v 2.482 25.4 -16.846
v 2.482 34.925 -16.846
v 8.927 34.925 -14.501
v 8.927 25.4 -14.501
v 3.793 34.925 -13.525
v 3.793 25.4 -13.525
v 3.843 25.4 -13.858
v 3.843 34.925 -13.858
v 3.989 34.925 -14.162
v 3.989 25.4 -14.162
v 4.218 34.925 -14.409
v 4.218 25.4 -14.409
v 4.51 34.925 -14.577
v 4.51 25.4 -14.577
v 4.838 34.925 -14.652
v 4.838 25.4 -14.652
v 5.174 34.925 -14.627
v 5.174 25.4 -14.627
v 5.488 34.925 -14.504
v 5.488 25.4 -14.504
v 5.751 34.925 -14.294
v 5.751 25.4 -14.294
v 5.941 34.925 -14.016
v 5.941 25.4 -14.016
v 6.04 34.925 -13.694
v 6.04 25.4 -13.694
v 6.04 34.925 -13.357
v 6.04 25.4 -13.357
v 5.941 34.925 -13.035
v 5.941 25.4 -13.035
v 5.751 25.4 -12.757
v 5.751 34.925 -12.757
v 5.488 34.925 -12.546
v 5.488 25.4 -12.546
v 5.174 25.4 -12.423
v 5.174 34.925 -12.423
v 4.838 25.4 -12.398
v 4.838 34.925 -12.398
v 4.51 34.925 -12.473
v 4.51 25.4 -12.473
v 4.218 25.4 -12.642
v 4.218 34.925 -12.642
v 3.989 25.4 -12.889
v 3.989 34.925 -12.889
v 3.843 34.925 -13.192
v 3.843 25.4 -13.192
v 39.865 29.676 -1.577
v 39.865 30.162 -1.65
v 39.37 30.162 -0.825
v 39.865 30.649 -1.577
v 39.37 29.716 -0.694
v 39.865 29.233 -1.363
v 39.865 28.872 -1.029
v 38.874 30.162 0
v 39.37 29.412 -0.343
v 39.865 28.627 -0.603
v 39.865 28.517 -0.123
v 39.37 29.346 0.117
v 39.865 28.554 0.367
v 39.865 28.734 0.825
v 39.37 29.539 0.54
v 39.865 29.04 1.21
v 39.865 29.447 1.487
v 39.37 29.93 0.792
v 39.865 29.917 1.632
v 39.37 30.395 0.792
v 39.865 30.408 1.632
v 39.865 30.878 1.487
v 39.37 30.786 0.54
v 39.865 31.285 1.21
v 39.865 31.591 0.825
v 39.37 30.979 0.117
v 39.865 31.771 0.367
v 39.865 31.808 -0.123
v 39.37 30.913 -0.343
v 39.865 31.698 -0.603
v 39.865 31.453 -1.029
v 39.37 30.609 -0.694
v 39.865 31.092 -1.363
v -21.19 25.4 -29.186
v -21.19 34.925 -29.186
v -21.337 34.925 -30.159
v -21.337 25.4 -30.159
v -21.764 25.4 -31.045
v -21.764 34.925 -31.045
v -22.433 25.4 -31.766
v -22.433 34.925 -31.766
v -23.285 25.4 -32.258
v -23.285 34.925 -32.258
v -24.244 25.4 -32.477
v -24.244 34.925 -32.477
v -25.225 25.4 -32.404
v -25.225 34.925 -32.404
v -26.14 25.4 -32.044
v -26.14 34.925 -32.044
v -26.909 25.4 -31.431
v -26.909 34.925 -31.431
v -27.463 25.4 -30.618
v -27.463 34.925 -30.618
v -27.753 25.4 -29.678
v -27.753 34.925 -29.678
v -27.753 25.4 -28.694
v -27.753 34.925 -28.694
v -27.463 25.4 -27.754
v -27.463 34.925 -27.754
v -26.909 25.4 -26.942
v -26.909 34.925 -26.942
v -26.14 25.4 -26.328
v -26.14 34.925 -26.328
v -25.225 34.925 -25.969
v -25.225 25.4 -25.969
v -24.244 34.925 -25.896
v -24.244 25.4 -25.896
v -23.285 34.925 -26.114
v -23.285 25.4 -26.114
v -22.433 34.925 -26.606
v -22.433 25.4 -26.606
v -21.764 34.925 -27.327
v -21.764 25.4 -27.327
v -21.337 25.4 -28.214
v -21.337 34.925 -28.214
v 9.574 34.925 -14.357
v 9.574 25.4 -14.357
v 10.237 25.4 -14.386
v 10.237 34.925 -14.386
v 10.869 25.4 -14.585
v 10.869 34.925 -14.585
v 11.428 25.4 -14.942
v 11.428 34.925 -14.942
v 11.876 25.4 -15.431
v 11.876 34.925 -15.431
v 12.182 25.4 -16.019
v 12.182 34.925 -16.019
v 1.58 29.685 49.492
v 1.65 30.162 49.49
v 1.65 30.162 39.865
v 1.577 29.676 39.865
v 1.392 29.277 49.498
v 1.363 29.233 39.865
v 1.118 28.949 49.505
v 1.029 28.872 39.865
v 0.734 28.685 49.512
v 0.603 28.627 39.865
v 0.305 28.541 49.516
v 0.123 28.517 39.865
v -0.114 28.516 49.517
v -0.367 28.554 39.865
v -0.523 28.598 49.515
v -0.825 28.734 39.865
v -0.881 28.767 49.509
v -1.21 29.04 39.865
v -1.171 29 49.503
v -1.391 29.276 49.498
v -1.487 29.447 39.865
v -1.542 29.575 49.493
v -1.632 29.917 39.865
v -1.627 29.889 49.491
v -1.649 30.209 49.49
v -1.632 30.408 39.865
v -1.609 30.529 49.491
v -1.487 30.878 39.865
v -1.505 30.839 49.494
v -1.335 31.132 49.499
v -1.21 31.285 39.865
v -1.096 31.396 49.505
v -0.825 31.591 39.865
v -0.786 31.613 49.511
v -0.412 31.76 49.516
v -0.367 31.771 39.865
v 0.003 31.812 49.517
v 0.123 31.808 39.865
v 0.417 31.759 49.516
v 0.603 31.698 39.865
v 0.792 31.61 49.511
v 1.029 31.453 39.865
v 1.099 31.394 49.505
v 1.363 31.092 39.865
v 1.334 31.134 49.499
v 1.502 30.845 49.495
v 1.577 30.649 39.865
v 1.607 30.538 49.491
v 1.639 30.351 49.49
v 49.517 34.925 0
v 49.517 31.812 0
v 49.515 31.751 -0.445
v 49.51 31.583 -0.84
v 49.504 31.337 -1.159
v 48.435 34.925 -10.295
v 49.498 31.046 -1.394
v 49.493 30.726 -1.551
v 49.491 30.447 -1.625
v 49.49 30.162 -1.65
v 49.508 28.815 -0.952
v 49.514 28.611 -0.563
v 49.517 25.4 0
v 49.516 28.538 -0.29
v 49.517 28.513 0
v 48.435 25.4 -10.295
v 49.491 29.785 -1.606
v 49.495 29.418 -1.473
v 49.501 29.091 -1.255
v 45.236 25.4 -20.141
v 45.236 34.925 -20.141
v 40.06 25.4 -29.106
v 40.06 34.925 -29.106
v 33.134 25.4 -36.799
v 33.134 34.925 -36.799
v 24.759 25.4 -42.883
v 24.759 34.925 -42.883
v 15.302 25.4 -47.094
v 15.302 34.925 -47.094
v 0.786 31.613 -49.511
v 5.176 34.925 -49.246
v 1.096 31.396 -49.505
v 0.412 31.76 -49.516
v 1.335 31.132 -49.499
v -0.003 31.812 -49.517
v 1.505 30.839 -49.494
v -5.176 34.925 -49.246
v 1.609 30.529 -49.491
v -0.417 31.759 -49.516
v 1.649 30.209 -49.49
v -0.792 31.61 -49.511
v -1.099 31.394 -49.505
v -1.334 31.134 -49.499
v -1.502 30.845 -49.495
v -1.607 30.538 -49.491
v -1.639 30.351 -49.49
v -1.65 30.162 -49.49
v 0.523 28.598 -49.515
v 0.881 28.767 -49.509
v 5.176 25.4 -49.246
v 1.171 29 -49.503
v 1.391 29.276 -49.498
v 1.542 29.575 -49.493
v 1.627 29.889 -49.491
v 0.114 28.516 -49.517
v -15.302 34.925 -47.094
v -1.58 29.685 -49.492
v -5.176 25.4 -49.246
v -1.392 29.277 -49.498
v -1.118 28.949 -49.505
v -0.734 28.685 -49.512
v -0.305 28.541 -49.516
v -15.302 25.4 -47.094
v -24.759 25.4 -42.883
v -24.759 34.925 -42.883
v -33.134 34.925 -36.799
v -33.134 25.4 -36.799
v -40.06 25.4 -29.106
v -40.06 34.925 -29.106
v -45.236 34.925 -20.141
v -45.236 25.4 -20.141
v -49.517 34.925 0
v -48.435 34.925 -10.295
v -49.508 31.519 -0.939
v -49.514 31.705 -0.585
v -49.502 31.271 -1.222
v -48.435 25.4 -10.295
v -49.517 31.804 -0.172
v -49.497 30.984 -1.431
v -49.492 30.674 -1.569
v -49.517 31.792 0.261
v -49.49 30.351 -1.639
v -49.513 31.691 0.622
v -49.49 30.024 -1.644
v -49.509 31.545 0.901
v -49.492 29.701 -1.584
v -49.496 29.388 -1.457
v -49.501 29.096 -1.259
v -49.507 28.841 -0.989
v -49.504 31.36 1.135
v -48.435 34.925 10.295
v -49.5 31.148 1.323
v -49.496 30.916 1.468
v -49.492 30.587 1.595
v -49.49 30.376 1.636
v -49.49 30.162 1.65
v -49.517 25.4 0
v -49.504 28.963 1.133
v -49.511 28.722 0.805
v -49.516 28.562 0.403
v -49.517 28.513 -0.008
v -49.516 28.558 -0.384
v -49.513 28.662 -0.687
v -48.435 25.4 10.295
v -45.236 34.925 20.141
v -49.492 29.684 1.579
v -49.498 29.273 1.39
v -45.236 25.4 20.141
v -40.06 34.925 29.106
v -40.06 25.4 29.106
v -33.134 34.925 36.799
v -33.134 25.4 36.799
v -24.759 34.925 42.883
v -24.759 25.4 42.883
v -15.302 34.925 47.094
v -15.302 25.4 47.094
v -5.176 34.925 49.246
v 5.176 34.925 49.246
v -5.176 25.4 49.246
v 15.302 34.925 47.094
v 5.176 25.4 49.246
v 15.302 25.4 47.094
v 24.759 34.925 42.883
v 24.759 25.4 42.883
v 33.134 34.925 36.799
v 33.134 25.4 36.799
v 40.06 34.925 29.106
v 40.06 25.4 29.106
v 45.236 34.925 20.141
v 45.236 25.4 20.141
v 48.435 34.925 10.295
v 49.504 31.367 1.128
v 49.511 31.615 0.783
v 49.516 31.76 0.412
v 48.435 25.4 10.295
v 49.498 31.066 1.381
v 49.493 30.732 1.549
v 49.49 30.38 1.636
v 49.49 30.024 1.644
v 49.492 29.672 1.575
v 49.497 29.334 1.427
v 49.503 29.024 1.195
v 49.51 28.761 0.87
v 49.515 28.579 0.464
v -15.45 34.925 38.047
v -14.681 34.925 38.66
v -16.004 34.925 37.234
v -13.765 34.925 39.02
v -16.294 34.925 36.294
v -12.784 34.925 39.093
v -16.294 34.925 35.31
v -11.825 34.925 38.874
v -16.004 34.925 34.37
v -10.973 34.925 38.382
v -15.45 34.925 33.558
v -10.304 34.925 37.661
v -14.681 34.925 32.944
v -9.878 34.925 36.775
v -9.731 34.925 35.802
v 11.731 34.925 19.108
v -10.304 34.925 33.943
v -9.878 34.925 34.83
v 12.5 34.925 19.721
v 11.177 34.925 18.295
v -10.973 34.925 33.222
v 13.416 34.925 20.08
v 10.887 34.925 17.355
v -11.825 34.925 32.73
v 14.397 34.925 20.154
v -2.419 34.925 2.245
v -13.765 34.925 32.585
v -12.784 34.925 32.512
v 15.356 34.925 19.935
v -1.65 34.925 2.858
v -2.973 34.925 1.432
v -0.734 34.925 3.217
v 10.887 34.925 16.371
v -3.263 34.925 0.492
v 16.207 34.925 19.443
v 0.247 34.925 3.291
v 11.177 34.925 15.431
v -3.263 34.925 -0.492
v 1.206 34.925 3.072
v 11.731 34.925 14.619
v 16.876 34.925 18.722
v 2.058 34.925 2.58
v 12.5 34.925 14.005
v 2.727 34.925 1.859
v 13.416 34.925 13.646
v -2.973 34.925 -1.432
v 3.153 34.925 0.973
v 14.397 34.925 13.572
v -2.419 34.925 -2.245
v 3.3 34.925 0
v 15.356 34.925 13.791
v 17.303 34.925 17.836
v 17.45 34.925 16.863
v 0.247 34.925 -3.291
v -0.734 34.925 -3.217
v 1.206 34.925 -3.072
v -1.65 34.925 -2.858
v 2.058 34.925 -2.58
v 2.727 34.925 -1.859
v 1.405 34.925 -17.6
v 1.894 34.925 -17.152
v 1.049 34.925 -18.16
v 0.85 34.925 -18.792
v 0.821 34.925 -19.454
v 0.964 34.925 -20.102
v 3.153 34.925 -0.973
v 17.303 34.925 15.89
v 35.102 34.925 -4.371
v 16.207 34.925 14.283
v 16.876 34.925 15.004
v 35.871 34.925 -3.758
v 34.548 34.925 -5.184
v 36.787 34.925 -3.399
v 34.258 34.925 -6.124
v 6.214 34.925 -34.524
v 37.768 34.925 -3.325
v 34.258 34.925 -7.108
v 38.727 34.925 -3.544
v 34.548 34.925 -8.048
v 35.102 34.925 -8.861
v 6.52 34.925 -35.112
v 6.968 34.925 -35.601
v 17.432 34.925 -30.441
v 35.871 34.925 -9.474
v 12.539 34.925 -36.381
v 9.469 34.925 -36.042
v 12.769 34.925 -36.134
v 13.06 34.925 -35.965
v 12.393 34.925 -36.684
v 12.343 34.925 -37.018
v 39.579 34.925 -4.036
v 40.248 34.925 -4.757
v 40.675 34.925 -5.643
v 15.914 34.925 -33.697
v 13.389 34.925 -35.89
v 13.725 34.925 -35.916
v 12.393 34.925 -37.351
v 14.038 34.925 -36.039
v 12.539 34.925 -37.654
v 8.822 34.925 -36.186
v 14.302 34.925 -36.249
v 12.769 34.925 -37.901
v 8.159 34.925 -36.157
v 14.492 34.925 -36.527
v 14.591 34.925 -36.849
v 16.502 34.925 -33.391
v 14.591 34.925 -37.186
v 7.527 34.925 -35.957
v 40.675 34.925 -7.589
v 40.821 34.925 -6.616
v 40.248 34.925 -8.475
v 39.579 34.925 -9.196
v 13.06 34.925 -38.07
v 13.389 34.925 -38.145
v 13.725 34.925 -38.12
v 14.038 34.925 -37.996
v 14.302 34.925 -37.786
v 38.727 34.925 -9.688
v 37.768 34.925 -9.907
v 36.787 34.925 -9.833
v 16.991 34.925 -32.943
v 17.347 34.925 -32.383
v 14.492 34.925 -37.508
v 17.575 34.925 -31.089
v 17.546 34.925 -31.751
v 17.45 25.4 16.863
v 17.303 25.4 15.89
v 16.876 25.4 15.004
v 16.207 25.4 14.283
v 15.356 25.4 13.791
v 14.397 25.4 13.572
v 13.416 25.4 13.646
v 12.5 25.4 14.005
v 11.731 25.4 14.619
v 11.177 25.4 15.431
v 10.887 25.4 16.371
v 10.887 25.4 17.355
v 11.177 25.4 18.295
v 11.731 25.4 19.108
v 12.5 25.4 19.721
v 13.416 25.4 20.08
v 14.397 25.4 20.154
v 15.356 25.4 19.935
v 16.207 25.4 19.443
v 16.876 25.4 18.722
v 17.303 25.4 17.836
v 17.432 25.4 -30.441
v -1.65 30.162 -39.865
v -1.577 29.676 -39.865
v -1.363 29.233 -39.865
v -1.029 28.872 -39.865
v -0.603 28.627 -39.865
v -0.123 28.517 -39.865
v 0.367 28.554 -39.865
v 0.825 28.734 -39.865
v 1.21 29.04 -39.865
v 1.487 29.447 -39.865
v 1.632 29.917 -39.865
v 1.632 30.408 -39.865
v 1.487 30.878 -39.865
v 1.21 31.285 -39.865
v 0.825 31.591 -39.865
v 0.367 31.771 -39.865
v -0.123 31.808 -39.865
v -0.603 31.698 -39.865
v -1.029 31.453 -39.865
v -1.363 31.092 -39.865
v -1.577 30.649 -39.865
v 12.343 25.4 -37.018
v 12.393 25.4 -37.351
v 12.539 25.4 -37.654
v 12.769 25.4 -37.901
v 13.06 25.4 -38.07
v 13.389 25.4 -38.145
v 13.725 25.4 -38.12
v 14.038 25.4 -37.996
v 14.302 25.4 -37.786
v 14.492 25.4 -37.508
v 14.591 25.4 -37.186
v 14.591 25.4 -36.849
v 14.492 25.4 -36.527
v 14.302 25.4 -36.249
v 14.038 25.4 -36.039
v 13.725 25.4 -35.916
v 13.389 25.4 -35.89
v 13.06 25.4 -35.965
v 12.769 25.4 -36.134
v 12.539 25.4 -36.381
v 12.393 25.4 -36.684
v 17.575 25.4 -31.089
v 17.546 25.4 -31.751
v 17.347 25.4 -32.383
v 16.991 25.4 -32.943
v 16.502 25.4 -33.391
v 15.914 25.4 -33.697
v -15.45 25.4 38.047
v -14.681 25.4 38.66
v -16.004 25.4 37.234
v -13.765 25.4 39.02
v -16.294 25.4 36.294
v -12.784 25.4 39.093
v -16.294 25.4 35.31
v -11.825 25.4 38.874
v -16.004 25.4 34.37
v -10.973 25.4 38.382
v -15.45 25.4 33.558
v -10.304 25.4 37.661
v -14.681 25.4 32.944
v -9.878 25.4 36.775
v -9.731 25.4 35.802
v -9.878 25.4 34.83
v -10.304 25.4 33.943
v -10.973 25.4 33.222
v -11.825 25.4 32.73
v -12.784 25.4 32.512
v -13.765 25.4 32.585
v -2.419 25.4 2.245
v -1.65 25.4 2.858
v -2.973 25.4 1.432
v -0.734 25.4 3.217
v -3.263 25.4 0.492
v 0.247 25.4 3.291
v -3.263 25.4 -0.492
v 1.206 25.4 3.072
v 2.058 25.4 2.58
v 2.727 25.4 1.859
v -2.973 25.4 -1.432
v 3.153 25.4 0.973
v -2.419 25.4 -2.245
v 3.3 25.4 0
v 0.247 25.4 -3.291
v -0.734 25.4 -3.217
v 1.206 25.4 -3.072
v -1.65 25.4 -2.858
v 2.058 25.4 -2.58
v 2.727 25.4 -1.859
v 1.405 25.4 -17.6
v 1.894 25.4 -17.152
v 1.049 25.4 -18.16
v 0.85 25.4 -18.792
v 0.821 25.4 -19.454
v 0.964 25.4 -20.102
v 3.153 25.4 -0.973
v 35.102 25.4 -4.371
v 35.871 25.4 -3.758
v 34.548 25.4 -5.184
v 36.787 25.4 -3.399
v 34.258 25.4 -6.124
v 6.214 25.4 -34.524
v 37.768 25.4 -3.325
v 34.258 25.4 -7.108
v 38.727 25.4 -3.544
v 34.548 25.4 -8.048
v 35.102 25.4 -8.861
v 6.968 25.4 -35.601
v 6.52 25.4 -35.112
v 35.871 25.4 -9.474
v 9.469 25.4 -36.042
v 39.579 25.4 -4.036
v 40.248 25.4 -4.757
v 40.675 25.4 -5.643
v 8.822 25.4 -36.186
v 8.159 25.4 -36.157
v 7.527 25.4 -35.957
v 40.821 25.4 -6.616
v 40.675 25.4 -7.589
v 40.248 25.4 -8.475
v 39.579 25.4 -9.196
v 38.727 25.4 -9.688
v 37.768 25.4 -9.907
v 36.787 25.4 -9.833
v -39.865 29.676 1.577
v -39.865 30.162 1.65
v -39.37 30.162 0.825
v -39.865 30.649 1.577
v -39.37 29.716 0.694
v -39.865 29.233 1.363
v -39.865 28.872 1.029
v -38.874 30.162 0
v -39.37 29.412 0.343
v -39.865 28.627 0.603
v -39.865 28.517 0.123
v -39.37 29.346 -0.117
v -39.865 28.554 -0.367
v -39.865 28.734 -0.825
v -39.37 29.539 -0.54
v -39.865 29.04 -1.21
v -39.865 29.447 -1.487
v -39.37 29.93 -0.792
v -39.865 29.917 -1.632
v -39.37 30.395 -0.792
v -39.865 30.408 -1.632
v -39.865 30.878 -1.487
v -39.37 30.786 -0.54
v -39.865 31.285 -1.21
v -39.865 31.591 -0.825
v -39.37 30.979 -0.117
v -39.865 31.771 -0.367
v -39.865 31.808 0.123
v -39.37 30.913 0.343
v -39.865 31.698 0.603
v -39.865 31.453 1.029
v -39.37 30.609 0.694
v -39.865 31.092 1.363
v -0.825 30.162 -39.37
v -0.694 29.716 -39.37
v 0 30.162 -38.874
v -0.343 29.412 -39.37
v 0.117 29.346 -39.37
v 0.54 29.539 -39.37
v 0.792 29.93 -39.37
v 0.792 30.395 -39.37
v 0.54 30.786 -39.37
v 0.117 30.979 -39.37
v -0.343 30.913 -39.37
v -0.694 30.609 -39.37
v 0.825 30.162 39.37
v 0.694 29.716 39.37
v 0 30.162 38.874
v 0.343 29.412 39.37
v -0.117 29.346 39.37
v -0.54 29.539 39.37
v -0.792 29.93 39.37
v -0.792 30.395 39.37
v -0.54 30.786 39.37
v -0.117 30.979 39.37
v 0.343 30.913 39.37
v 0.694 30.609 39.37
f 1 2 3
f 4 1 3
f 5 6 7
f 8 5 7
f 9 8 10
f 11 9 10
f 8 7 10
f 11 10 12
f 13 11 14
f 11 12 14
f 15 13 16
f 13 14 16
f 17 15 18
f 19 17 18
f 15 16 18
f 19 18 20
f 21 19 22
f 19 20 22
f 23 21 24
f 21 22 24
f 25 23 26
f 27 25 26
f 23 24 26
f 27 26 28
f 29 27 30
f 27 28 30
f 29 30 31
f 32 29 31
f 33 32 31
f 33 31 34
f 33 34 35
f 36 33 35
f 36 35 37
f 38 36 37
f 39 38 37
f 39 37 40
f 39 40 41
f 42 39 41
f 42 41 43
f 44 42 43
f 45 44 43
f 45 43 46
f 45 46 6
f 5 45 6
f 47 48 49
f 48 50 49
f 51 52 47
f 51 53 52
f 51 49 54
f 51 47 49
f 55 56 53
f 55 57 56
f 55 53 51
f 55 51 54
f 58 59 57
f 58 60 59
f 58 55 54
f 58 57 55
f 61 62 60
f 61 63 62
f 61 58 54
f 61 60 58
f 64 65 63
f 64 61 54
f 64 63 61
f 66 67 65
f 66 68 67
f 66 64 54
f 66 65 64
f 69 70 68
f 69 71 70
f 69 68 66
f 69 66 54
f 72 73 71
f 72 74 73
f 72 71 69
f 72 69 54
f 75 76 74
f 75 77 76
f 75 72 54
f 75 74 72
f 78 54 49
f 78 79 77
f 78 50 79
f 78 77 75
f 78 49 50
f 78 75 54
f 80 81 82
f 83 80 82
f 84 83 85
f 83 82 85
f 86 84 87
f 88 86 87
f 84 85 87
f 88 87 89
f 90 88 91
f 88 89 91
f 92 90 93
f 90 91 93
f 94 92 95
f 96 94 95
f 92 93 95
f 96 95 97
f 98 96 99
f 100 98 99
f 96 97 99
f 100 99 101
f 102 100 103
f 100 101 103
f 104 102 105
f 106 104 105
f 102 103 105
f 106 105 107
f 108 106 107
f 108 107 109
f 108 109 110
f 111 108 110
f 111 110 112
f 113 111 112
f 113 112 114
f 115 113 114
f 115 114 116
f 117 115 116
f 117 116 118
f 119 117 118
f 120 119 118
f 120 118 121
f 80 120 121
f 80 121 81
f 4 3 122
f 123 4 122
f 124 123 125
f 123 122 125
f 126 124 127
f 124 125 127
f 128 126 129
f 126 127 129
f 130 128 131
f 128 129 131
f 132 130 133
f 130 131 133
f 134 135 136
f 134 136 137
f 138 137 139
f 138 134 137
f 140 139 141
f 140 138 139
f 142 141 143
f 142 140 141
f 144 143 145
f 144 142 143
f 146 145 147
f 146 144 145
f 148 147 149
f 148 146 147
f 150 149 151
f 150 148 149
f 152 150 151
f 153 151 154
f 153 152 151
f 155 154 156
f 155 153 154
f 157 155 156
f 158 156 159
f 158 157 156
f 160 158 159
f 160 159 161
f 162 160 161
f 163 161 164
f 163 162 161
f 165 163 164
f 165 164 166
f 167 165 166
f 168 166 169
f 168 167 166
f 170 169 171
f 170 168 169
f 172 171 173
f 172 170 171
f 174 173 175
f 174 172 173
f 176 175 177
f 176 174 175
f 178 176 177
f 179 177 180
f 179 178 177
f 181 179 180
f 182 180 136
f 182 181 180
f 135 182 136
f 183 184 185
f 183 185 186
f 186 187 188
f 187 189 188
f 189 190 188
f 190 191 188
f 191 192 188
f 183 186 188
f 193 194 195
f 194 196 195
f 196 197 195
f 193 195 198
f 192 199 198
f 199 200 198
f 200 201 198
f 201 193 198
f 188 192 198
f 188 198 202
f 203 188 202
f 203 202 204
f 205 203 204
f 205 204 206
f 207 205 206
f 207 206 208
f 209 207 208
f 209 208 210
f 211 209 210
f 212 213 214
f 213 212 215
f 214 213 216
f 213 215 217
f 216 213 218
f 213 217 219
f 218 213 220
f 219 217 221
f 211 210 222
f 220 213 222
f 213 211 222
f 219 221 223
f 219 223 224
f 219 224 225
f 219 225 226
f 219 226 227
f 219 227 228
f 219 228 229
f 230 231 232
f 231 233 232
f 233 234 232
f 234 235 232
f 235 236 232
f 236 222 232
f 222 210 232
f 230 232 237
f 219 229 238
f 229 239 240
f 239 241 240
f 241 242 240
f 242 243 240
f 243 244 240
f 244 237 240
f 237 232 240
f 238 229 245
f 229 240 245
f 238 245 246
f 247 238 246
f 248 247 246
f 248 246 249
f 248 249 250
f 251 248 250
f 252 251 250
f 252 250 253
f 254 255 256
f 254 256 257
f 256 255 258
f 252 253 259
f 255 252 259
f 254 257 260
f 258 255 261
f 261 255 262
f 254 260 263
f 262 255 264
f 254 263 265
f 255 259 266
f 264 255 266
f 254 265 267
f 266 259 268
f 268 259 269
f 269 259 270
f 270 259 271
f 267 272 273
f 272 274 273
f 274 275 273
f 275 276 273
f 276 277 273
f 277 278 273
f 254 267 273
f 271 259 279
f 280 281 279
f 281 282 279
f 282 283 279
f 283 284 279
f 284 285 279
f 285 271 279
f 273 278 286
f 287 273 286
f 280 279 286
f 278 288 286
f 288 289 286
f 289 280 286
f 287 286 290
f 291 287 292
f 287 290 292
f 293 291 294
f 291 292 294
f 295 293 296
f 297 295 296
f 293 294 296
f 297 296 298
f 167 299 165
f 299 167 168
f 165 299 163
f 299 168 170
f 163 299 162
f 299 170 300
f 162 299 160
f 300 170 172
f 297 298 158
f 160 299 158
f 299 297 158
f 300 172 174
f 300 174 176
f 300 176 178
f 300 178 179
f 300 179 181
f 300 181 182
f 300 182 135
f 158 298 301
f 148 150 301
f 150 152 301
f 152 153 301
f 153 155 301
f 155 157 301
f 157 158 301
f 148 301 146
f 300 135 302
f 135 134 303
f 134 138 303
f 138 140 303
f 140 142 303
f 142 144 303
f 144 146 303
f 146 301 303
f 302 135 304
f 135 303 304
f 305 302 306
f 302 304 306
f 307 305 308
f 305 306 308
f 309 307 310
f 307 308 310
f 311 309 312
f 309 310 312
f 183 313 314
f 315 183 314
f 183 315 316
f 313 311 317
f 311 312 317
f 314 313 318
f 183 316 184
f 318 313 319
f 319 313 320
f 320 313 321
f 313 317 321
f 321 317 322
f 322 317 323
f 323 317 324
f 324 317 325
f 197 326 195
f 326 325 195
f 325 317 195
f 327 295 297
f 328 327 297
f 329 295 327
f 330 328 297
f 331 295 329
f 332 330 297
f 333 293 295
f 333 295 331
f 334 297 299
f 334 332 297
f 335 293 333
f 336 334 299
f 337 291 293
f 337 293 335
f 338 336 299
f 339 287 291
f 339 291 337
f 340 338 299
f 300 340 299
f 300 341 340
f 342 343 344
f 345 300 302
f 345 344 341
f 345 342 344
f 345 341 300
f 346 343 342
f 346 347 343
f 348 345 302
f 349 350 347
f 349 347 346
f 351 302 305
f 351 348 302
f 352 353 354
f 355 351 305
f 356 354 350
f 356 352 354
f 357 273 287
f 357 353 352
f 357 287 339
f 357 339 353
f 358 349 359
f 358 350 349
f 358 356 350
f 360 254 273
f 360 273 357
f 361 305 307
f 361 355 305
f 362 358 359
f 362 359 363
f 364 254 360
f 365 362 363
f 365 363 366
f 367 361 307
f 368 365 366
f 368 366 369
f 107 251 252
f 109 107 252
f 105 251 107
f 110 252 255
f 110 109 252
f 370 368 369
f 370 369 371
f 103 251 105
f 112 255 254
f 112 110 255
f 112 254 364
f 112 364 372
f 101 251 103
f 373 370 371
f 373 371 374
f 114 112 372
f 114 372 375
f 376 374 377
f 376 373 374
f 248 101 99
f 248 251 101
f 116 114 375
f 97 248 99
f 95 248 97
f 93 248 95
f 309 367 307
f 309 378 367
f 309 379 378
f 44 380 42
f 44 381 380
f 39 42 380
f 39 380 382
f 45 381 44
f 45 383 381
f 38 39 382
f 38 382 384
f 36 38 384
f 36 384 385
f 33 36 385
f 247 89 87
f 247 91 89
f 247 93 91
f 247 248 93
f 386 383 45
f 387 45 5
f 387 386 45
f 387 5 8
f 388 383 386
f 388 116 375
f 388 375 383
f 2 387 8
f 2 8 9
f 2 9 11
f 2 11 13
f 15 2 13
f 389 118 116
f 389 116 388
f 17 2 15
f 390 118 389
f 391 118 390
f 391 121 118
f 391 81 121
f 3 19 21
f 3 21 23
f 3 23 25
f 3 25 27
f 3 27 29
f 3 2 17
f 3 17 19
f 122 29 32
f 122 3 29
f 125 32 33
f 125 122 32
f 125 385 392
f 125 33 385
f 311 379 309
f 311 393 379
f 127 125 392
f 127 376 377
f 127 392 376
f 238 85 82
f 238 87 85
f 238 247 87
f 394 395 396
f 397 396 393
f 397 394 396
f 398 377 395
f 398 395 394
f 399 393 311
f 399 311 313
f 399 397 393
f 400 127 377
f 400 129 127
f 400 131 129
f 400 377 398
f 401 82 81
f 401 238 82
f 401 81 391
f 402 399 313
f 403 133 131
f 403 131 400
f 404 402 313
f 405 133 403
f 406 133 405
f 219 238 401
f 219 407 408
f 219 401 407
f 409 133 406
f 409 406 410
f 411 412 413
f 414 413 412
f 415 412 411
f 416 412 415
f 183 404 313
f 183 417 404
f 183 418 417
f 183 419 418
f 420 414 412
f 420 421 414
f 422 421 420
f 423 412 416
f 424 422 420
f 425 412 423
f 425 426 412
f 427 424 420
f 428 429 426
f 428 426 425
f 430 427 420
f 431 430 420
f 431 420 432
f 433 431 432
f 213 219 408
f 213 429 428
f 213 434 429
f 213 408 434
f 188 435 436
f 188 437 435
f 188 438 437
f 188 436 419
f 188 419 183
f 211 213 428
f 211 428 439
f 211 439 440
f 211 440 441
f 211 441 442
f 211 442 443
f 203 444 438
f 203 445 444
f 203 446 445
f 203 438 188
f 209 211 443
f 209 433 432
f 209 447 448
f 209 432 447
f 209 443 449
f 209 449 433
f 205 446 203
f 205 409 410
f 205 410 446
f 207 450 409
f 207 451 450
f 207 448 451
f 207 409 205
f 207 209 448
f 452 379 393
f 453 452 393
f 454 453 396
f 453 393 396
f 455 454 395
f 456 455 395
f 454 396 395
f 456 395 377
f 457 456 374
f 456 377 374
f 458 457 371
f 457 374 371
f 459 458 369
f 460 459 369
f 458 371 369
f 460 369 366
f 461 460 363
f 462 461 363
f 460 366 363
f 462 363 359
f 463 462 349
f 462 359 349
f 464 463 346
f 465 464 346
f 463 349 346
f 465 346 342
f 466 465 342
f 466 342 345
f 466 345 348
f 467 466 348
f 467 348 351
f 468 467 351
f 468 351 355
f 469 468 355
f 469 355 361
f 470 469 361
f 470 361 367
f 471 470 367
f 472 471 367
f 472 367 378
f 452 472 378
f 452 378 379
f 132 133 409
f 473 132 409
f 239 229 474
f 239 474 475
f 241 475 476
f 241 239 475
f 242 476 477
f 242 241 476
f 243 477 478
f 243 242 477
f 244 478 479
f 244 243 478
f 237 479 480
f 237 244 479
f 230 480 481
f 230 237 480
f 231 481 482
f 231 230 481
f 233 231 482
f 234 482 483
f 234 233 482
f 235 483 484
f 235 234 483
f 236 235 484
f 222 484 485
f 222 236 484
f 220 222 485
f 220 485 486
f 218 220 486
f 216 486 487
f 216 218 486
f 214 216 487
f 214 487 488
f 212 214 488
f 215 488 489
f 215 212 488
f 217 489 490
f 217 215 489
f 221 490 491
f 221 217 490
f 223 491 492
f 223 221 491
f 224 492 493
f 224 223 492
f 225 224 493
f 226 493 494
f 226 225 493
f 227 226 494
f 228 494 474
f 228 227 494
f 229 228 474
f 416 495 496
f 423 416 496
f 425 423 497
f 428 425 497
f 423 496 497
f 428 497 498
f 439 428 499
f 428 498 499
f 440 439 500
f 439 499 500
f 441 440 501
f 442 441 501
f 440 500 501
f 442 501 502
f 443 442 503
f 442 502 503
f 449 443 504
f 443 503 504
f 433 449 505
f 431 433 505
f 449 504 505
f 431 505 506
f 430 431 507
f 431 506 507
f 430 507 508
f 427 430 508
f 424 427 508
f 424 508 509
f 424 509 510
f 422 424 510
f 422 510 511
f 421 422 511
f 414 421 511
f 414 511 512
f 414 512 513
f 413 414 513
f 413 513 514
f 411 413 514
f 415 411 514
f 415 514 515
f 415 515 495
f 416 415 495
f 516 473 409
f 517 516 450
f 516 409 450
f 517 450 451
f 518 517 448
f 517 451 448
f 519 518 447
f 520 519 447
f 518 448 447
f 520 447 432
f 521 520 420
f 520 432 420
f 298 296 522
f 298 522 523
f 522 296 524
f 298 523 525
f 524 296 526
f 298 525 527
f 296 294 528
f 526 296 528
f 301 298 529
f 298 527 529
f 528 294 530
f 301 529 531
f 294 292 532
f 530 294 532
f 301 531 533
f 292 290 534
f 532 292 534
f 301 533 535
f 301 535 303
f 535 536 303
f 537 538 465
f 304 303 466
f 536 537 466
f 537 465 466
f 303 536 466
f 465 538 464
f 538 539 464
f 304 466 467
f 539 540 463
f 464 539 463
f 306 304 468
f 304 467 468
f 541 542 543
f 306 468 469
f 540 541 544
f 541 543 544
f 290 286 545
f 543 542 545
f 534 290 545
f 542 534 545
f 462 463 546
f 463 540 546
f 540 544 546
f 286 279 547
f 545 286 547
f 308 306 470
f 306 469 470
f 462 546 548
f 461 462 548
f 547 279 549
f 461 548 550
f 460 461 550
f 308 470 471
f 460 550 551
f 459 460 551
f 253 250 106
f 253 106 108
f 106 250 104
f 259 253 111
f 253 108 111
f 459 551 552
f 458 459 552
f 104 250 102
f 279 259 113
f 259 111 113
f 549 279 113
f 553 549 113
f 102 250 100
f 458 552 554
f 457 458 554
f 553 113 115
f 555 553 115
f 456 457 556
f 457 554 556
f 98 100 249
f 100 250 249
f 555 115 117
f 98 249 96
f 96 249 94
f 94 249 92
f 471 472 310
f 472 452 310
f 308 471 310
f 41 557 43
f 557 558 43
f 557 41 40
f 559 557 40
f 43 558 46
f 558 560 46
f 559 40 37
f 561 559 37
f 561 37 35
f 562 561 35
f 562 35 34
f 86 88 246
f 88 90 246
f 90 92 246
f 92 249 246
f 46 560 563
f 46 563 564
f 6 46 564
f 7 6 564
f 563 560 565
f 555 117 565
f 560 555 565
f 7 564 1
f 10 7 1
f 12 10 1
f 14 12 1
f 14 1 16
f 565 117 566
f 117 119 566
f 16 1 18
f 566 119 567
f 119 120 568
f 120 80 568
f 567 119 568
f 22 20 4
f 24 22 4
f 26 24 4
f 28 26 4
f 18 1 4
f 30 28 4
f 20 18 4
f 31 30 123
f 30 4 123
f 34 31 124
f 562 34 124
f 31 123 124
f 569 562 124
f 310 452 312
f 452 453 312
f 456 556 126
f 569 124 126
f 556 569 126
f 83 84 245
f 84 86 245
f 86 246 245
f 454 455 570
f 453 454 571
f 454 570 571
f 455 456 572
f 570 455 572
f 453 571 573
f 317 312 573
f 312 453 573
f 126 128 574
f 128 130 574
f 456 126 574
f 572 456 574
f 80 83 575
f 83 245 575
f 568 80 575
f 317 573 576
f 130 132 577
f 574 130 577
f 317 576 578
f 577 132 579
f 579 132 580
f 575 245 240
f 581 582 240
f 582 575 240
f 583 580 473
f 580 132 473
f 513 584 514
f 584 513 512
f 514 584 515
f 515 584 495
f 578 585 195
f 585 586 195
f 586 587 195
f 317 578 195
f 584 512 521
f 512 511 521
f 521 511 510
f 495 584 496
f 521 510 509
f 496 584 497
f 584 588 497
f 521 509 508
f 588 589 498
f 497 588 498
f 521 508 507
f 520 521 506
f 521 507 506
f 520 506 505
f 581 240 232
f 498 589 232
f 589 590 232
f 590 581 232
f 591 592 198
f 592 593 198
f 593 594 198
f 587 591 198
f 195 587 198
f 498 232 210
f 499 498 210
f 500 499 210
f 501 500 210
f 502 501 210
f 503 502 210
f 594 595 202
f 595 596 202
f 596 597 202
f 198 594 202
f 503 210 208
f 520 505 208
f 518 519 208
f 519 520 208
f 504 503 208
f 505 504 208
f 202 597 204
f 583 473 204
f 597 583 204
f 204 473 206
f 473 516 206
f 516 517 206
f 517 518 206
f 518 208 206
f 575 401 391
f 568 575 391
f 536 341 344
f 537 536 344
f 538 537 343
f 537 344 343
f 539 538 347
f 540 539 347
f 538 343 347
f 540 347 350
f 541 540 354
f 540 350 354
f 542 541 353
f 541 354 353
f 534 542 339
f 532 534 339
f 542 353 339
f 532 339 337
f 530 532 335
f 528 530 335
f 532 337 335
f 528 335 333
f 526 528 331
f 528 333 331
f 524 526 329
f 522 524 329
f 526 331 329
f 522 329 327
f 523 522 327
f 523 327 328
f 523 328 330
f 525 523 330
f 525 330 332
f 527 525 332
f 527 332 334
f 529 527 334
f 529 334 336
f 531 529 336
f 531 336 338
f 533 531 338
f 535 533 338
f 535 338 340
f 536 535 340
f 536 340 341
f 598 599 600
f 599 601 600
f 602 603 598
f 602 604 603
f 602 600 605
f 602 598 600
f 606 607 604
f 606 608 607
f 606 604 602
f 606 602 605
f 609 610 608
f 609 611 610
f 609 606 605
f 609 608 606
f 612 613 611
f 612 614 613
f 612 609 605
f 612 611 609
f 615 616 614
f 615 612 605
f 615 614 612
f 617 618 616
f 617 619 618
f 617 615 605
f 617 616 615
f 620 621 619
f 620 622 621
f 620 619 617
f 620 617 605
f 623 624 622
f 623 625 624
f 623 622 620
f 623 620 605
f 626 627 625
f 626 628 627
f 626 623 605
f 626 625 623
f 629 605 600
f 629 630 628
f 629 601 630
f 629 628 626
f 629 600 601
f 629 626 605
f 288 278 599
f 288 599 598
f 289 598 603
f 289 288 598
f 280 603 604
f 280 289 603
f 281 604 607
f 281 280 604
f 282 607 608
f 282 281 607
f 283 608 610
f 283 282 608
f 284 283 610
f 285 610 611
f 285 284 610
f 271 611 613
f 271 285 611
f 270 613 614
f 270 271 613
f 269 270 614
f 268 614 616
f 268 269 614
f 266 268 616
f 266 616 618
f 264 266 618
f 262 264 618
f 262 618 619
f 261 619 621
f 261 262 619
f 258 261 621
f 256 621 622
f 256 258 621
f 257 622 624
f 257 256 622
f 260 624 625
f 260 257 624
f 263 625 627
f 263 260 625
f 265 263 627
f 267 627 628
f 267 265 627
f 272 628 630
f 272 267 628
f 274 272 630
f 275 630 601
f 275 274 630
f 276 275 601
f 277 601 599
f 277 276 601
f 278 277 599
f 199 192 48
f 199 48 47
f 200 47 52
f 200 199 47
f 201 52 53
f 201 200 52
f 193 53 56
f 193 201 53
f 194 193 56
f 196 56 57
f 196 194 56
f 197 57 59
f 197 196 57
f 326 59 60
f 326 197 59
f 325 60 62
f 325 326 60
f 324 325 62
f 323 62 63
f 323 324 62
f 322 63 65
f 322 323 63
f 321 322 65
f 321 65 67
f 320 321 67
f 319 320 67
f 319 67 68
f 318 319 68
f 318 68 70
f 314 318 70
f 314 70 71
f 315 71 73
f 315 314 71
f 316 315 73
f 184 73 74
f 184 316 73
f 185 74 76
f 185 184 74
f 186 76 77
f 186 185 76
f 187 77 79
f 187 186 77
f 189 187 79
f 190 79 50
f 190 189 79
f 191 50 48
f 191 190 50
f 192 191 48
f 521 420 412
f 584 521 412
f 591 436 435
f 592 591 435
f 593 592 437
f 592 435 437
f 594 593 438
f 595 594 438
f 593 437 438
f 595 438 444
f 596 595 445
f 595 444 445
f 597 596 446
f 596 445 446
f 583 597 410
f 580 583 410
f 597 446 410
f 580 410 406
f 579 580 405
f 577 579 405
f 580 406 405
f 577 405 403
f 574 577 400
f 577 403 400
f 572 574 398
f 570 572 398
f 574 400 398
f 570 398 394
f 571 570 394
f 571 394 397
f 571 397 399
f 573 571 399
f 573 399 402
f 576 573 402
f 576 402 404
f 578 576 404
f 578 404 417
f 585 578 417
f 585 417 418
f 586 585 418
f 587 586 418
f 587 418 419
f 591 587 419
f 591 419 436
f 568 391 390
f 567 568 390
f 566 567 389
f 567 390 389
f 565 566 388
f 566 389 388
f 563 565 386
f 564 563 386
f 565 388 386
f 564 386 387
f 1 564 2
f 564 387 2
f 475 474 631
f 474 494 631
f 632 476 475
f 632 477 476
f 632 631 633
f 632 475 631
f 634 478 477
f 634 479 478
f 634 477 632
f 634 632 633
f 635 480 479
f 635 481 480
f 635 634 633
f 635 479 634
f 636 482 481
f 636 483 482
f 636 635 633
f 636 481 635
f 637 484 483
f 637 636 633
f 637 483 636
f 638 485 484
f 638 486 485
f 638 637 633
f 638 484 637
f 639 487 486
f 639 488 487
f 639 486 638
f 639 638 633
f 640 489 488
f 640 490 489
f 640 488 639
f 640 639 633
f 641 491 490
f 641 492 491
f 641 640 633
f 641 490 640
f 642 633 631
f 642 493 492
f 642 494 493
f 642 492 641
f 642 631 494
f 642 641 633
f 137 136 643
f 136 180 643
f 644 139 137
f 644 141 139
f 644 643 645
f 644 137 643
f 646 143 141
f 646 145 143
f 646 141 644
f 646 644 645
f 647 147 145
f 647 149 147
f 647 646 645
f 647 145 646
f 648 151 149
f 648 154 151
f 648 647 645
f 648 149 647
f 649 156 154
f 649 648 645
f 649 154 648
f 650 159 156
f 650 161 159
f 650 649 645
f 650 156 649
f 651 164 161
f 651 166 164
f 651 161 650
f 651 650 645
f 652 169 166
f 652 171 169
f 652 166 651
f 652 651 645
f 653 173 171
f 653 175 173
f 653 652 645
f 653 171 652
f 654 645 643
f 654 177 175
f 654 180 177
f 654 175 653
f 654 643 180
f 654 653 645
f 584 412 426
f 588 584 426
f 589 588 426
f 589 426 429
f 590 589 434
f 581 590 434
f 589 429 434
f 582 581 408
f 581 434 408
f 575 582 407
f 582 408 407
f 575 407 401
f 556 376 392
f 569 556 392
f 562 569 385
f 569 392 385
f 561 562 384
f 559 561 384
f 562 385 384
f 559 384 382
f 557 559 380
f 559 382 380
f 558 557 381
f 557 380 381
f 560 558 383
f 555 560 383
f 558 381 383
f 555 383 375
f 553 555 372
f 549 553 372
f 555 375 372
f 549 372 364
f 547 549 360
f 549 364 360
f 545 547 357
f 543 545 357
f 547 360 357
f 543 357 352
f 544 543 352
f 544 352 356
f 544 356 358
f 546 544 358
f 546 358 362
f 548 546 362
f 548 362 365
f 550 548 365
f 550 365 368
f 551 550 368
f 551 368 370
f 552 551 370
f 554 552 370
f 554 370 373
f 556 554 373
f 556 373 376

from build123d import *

# Parameters (mm, degrees)
SKETCH1_R                 = 78.359
SKETCH1_R_2               = 51.1048
BOSS_EXTRUDE1_DEPTH       = 25.4
SKETCH6_R                 = 49.5173
BOSS_EXTRUDE5_DEPTH       = 9.525
SKETCH7_R                 = 49.5173
BOSS_EXTRUDE6_DEPTH       = 9.525
SKETCH9_R                 = 3.3
CUT_EXTRUDE6_DEPTH        = 45.45
SKETCH10_R                = 82.322787435
CUT_EXTRUDE7_DEPTH        = 35.925
TAP_DRILL_FOR_4_40_TAP1_D = 2.2606
CUT_EXTRUDE9_DEPTH        = 10.525
CIRPATTERN1_COUNT         = 4


with BuildPart() as part:
    # Sketch1 → Boss-Extrude1 (new body)
    with BuildSketch(Plane(origin=(0, 0, 0), x_dir=(1, 0, 0), z_dir=(0, 1, 0))):
        Circle(SKETCH1_R)
        Circle(SKETCH1_R_2, mode=Mode.SUBTRACT)
    extrude(amount=BOSS_EXTRUDE1_DEPTH)


with BuildPart() as body_2:
    # Sketch6 → Boss-Extrude5 (new body)
    with BuildSketch(Plane(origin=(0, 25.4, 0), x_dir=(1, 0, 0), z_dir=(0, 1, 0))):
        Circle(SKETCH6_R)
    extrude(amount=BOSS_EXTRUDE5_DEPTH)


with BuildPart() as body_3:
    # Sketch7 → Boss-Extrude6 (new body)
    with BuildSketch(Plane.XZ):
        Circle(SKETCH7_R)
    extrude(amount=BOSS_EXTRUDE6_DEPTH)


with BuildPart() as cut_extrude6_tool:
    # Sketch9 → Cut-Extrude6 (new body, through all)
    with BuildSketch(Plane(origin=(0, 34.925, 0), x_dir=(1, 0, 0), z_dir=(0, 1, 0))):
        Circle(SKETCH9_R)
        with Locations((-13.030967461, -35.802288852)):
            Circle(SKETCH9_R)
        with Locations((14.149897915, -16.863191675)):
            Circle(SKETCH9_R)
        with Locations((-24.490207929, 29.186293283)):
            Circle(SKETCH9_R)
        with Locations((37.52117539, 6.615995569)):
            Circle(SKETCH9_R)
    extrude(amount=-CUT_EXTRUDE6_DEPTH)


with BuildPart() as body_2_1:
    add(body_2.part)

    # Cut-Extrude6: cut by cut_extrude6_tool
    add(cut_extrude6_tool.part, mode=Mode.SUBTRACT)

    # Tap Drill for #4-40 Tap1 (through all)
    with Locations(Plane(origin=(0, 34.925, 0), x_dir=(1, 0, 0), z_dir=(0, 1, 0))):
        with Locations((4.92280993, 13.525309122), (13.473313526, 37.017624677)):
            Hole(TAP_DRILL_FOR_4_40_TAP1_D / 2)

    # Sketch14 → Cut-Extrude9 (cut, through all)
    with BuildSketch(Plane(origin=(0, 34.925, 0), x_dir=(1, 0, 0), z_dir=(0, 1, 0))):
        with BuildLine():
            Line((12.182424395, 16.018747474), (17.431749568, 30.441149854))
            ThreePointArc((17.431749568, 30.441149854), (17.34695209, 32.383331403), (15.913661475, 33.696700275))
            Line((15.913661475, 33.696700275), (9.469249481, 36.042274418))
            ThreePointArc((9.469249481, 36.042274418), (7.527067933, 35.95747694), (6.213699061, 34.524186325))
            Line((6.213699061, 34.524186325), (0.964373888, 20.101783945))
            ThreePointArc((0.964373888, 20.101783945), (1.049171366, 18.159602396), (2.482461981, 16.846233524))
            Line((2.482461981, 16.846233524), (8.926873974, 14.500659381))
            ThreePointArc((8.926873974, 14.500659381), (10.869055523, 14.585456859), (12.182424395, 16.018747474))
        make_face()
    extrude(amount=-CUT_EXTRUDE9_DEPTH, mode=Mode.SUBTRACT)

    # Sketch17 → Tap Drill for M4x0.7 Tap1 (revolve, cut)
    with BuildSketch(Plane(origin=(49.5173, 30.1625, 0), x_dir=(0, 0, -1), z_dir=(0, 1, 0))):
        Polygon((0, 0), (0, 10.643420021), (1.65, 9.652), (1.65, 0), align=None)
    tap_drill_for_m4x0_7_tap1 = revolve(axis=Axis((55.8673, 30.1625, 0), (-1, 0, 0)), mode=Mode.SUBTRACT)

    # CirPattern1: Tap Drill for M4x0.7 Tap1 ×4 about axis
    cirpattern1_axis = Axis((0, 34.925, 0), (0, 1, 0))
    for i in range(1, CIRPATTERN1_COUNT):
        add(tap_drill_for_m4x0_7_tap1.rotate(cirpattern1_axis, i * 360 / CIRPATTERN1_COUNT), mode=Mode.SUBTRACT)


with BuildPart() as body_3_1:
    add(body_3.part)

    # Cut-Extrude6: cut by cut_extrude6_tool
    add(cut_extrude6_tool.part, mode=Mode.SUBTRACT)


with BuildPart() as cut_extrude7_tool:
    # Sketch10 → Cut-Extrude7 (new body, through all)
    with BuildSketch(Plane(origin=(0, 25.4, 0), x_dir=(1, 0, 0), z_dir=(0, 1, 0))):
        Circle(SKETCH10_R)
    extrude(amount=-CUT_EXTRUDE7_DEPTH)


with BuildPart() as part_1:
    add(part.part)

    # Cut-Extrude7: cut by cut_extrude7_tool
    add(cut_extrude7_tool.part, mode=Mode.SUBTRACT)


with BuildPart() as body_3_2:
    add(body_3_1.part)

    # Cut-Extrude7: cut by cut_extrude7_tool
    add(cut_extrude7_tool.part, mode=Mode.SUBTRACT)


solid = body_2_1.part
